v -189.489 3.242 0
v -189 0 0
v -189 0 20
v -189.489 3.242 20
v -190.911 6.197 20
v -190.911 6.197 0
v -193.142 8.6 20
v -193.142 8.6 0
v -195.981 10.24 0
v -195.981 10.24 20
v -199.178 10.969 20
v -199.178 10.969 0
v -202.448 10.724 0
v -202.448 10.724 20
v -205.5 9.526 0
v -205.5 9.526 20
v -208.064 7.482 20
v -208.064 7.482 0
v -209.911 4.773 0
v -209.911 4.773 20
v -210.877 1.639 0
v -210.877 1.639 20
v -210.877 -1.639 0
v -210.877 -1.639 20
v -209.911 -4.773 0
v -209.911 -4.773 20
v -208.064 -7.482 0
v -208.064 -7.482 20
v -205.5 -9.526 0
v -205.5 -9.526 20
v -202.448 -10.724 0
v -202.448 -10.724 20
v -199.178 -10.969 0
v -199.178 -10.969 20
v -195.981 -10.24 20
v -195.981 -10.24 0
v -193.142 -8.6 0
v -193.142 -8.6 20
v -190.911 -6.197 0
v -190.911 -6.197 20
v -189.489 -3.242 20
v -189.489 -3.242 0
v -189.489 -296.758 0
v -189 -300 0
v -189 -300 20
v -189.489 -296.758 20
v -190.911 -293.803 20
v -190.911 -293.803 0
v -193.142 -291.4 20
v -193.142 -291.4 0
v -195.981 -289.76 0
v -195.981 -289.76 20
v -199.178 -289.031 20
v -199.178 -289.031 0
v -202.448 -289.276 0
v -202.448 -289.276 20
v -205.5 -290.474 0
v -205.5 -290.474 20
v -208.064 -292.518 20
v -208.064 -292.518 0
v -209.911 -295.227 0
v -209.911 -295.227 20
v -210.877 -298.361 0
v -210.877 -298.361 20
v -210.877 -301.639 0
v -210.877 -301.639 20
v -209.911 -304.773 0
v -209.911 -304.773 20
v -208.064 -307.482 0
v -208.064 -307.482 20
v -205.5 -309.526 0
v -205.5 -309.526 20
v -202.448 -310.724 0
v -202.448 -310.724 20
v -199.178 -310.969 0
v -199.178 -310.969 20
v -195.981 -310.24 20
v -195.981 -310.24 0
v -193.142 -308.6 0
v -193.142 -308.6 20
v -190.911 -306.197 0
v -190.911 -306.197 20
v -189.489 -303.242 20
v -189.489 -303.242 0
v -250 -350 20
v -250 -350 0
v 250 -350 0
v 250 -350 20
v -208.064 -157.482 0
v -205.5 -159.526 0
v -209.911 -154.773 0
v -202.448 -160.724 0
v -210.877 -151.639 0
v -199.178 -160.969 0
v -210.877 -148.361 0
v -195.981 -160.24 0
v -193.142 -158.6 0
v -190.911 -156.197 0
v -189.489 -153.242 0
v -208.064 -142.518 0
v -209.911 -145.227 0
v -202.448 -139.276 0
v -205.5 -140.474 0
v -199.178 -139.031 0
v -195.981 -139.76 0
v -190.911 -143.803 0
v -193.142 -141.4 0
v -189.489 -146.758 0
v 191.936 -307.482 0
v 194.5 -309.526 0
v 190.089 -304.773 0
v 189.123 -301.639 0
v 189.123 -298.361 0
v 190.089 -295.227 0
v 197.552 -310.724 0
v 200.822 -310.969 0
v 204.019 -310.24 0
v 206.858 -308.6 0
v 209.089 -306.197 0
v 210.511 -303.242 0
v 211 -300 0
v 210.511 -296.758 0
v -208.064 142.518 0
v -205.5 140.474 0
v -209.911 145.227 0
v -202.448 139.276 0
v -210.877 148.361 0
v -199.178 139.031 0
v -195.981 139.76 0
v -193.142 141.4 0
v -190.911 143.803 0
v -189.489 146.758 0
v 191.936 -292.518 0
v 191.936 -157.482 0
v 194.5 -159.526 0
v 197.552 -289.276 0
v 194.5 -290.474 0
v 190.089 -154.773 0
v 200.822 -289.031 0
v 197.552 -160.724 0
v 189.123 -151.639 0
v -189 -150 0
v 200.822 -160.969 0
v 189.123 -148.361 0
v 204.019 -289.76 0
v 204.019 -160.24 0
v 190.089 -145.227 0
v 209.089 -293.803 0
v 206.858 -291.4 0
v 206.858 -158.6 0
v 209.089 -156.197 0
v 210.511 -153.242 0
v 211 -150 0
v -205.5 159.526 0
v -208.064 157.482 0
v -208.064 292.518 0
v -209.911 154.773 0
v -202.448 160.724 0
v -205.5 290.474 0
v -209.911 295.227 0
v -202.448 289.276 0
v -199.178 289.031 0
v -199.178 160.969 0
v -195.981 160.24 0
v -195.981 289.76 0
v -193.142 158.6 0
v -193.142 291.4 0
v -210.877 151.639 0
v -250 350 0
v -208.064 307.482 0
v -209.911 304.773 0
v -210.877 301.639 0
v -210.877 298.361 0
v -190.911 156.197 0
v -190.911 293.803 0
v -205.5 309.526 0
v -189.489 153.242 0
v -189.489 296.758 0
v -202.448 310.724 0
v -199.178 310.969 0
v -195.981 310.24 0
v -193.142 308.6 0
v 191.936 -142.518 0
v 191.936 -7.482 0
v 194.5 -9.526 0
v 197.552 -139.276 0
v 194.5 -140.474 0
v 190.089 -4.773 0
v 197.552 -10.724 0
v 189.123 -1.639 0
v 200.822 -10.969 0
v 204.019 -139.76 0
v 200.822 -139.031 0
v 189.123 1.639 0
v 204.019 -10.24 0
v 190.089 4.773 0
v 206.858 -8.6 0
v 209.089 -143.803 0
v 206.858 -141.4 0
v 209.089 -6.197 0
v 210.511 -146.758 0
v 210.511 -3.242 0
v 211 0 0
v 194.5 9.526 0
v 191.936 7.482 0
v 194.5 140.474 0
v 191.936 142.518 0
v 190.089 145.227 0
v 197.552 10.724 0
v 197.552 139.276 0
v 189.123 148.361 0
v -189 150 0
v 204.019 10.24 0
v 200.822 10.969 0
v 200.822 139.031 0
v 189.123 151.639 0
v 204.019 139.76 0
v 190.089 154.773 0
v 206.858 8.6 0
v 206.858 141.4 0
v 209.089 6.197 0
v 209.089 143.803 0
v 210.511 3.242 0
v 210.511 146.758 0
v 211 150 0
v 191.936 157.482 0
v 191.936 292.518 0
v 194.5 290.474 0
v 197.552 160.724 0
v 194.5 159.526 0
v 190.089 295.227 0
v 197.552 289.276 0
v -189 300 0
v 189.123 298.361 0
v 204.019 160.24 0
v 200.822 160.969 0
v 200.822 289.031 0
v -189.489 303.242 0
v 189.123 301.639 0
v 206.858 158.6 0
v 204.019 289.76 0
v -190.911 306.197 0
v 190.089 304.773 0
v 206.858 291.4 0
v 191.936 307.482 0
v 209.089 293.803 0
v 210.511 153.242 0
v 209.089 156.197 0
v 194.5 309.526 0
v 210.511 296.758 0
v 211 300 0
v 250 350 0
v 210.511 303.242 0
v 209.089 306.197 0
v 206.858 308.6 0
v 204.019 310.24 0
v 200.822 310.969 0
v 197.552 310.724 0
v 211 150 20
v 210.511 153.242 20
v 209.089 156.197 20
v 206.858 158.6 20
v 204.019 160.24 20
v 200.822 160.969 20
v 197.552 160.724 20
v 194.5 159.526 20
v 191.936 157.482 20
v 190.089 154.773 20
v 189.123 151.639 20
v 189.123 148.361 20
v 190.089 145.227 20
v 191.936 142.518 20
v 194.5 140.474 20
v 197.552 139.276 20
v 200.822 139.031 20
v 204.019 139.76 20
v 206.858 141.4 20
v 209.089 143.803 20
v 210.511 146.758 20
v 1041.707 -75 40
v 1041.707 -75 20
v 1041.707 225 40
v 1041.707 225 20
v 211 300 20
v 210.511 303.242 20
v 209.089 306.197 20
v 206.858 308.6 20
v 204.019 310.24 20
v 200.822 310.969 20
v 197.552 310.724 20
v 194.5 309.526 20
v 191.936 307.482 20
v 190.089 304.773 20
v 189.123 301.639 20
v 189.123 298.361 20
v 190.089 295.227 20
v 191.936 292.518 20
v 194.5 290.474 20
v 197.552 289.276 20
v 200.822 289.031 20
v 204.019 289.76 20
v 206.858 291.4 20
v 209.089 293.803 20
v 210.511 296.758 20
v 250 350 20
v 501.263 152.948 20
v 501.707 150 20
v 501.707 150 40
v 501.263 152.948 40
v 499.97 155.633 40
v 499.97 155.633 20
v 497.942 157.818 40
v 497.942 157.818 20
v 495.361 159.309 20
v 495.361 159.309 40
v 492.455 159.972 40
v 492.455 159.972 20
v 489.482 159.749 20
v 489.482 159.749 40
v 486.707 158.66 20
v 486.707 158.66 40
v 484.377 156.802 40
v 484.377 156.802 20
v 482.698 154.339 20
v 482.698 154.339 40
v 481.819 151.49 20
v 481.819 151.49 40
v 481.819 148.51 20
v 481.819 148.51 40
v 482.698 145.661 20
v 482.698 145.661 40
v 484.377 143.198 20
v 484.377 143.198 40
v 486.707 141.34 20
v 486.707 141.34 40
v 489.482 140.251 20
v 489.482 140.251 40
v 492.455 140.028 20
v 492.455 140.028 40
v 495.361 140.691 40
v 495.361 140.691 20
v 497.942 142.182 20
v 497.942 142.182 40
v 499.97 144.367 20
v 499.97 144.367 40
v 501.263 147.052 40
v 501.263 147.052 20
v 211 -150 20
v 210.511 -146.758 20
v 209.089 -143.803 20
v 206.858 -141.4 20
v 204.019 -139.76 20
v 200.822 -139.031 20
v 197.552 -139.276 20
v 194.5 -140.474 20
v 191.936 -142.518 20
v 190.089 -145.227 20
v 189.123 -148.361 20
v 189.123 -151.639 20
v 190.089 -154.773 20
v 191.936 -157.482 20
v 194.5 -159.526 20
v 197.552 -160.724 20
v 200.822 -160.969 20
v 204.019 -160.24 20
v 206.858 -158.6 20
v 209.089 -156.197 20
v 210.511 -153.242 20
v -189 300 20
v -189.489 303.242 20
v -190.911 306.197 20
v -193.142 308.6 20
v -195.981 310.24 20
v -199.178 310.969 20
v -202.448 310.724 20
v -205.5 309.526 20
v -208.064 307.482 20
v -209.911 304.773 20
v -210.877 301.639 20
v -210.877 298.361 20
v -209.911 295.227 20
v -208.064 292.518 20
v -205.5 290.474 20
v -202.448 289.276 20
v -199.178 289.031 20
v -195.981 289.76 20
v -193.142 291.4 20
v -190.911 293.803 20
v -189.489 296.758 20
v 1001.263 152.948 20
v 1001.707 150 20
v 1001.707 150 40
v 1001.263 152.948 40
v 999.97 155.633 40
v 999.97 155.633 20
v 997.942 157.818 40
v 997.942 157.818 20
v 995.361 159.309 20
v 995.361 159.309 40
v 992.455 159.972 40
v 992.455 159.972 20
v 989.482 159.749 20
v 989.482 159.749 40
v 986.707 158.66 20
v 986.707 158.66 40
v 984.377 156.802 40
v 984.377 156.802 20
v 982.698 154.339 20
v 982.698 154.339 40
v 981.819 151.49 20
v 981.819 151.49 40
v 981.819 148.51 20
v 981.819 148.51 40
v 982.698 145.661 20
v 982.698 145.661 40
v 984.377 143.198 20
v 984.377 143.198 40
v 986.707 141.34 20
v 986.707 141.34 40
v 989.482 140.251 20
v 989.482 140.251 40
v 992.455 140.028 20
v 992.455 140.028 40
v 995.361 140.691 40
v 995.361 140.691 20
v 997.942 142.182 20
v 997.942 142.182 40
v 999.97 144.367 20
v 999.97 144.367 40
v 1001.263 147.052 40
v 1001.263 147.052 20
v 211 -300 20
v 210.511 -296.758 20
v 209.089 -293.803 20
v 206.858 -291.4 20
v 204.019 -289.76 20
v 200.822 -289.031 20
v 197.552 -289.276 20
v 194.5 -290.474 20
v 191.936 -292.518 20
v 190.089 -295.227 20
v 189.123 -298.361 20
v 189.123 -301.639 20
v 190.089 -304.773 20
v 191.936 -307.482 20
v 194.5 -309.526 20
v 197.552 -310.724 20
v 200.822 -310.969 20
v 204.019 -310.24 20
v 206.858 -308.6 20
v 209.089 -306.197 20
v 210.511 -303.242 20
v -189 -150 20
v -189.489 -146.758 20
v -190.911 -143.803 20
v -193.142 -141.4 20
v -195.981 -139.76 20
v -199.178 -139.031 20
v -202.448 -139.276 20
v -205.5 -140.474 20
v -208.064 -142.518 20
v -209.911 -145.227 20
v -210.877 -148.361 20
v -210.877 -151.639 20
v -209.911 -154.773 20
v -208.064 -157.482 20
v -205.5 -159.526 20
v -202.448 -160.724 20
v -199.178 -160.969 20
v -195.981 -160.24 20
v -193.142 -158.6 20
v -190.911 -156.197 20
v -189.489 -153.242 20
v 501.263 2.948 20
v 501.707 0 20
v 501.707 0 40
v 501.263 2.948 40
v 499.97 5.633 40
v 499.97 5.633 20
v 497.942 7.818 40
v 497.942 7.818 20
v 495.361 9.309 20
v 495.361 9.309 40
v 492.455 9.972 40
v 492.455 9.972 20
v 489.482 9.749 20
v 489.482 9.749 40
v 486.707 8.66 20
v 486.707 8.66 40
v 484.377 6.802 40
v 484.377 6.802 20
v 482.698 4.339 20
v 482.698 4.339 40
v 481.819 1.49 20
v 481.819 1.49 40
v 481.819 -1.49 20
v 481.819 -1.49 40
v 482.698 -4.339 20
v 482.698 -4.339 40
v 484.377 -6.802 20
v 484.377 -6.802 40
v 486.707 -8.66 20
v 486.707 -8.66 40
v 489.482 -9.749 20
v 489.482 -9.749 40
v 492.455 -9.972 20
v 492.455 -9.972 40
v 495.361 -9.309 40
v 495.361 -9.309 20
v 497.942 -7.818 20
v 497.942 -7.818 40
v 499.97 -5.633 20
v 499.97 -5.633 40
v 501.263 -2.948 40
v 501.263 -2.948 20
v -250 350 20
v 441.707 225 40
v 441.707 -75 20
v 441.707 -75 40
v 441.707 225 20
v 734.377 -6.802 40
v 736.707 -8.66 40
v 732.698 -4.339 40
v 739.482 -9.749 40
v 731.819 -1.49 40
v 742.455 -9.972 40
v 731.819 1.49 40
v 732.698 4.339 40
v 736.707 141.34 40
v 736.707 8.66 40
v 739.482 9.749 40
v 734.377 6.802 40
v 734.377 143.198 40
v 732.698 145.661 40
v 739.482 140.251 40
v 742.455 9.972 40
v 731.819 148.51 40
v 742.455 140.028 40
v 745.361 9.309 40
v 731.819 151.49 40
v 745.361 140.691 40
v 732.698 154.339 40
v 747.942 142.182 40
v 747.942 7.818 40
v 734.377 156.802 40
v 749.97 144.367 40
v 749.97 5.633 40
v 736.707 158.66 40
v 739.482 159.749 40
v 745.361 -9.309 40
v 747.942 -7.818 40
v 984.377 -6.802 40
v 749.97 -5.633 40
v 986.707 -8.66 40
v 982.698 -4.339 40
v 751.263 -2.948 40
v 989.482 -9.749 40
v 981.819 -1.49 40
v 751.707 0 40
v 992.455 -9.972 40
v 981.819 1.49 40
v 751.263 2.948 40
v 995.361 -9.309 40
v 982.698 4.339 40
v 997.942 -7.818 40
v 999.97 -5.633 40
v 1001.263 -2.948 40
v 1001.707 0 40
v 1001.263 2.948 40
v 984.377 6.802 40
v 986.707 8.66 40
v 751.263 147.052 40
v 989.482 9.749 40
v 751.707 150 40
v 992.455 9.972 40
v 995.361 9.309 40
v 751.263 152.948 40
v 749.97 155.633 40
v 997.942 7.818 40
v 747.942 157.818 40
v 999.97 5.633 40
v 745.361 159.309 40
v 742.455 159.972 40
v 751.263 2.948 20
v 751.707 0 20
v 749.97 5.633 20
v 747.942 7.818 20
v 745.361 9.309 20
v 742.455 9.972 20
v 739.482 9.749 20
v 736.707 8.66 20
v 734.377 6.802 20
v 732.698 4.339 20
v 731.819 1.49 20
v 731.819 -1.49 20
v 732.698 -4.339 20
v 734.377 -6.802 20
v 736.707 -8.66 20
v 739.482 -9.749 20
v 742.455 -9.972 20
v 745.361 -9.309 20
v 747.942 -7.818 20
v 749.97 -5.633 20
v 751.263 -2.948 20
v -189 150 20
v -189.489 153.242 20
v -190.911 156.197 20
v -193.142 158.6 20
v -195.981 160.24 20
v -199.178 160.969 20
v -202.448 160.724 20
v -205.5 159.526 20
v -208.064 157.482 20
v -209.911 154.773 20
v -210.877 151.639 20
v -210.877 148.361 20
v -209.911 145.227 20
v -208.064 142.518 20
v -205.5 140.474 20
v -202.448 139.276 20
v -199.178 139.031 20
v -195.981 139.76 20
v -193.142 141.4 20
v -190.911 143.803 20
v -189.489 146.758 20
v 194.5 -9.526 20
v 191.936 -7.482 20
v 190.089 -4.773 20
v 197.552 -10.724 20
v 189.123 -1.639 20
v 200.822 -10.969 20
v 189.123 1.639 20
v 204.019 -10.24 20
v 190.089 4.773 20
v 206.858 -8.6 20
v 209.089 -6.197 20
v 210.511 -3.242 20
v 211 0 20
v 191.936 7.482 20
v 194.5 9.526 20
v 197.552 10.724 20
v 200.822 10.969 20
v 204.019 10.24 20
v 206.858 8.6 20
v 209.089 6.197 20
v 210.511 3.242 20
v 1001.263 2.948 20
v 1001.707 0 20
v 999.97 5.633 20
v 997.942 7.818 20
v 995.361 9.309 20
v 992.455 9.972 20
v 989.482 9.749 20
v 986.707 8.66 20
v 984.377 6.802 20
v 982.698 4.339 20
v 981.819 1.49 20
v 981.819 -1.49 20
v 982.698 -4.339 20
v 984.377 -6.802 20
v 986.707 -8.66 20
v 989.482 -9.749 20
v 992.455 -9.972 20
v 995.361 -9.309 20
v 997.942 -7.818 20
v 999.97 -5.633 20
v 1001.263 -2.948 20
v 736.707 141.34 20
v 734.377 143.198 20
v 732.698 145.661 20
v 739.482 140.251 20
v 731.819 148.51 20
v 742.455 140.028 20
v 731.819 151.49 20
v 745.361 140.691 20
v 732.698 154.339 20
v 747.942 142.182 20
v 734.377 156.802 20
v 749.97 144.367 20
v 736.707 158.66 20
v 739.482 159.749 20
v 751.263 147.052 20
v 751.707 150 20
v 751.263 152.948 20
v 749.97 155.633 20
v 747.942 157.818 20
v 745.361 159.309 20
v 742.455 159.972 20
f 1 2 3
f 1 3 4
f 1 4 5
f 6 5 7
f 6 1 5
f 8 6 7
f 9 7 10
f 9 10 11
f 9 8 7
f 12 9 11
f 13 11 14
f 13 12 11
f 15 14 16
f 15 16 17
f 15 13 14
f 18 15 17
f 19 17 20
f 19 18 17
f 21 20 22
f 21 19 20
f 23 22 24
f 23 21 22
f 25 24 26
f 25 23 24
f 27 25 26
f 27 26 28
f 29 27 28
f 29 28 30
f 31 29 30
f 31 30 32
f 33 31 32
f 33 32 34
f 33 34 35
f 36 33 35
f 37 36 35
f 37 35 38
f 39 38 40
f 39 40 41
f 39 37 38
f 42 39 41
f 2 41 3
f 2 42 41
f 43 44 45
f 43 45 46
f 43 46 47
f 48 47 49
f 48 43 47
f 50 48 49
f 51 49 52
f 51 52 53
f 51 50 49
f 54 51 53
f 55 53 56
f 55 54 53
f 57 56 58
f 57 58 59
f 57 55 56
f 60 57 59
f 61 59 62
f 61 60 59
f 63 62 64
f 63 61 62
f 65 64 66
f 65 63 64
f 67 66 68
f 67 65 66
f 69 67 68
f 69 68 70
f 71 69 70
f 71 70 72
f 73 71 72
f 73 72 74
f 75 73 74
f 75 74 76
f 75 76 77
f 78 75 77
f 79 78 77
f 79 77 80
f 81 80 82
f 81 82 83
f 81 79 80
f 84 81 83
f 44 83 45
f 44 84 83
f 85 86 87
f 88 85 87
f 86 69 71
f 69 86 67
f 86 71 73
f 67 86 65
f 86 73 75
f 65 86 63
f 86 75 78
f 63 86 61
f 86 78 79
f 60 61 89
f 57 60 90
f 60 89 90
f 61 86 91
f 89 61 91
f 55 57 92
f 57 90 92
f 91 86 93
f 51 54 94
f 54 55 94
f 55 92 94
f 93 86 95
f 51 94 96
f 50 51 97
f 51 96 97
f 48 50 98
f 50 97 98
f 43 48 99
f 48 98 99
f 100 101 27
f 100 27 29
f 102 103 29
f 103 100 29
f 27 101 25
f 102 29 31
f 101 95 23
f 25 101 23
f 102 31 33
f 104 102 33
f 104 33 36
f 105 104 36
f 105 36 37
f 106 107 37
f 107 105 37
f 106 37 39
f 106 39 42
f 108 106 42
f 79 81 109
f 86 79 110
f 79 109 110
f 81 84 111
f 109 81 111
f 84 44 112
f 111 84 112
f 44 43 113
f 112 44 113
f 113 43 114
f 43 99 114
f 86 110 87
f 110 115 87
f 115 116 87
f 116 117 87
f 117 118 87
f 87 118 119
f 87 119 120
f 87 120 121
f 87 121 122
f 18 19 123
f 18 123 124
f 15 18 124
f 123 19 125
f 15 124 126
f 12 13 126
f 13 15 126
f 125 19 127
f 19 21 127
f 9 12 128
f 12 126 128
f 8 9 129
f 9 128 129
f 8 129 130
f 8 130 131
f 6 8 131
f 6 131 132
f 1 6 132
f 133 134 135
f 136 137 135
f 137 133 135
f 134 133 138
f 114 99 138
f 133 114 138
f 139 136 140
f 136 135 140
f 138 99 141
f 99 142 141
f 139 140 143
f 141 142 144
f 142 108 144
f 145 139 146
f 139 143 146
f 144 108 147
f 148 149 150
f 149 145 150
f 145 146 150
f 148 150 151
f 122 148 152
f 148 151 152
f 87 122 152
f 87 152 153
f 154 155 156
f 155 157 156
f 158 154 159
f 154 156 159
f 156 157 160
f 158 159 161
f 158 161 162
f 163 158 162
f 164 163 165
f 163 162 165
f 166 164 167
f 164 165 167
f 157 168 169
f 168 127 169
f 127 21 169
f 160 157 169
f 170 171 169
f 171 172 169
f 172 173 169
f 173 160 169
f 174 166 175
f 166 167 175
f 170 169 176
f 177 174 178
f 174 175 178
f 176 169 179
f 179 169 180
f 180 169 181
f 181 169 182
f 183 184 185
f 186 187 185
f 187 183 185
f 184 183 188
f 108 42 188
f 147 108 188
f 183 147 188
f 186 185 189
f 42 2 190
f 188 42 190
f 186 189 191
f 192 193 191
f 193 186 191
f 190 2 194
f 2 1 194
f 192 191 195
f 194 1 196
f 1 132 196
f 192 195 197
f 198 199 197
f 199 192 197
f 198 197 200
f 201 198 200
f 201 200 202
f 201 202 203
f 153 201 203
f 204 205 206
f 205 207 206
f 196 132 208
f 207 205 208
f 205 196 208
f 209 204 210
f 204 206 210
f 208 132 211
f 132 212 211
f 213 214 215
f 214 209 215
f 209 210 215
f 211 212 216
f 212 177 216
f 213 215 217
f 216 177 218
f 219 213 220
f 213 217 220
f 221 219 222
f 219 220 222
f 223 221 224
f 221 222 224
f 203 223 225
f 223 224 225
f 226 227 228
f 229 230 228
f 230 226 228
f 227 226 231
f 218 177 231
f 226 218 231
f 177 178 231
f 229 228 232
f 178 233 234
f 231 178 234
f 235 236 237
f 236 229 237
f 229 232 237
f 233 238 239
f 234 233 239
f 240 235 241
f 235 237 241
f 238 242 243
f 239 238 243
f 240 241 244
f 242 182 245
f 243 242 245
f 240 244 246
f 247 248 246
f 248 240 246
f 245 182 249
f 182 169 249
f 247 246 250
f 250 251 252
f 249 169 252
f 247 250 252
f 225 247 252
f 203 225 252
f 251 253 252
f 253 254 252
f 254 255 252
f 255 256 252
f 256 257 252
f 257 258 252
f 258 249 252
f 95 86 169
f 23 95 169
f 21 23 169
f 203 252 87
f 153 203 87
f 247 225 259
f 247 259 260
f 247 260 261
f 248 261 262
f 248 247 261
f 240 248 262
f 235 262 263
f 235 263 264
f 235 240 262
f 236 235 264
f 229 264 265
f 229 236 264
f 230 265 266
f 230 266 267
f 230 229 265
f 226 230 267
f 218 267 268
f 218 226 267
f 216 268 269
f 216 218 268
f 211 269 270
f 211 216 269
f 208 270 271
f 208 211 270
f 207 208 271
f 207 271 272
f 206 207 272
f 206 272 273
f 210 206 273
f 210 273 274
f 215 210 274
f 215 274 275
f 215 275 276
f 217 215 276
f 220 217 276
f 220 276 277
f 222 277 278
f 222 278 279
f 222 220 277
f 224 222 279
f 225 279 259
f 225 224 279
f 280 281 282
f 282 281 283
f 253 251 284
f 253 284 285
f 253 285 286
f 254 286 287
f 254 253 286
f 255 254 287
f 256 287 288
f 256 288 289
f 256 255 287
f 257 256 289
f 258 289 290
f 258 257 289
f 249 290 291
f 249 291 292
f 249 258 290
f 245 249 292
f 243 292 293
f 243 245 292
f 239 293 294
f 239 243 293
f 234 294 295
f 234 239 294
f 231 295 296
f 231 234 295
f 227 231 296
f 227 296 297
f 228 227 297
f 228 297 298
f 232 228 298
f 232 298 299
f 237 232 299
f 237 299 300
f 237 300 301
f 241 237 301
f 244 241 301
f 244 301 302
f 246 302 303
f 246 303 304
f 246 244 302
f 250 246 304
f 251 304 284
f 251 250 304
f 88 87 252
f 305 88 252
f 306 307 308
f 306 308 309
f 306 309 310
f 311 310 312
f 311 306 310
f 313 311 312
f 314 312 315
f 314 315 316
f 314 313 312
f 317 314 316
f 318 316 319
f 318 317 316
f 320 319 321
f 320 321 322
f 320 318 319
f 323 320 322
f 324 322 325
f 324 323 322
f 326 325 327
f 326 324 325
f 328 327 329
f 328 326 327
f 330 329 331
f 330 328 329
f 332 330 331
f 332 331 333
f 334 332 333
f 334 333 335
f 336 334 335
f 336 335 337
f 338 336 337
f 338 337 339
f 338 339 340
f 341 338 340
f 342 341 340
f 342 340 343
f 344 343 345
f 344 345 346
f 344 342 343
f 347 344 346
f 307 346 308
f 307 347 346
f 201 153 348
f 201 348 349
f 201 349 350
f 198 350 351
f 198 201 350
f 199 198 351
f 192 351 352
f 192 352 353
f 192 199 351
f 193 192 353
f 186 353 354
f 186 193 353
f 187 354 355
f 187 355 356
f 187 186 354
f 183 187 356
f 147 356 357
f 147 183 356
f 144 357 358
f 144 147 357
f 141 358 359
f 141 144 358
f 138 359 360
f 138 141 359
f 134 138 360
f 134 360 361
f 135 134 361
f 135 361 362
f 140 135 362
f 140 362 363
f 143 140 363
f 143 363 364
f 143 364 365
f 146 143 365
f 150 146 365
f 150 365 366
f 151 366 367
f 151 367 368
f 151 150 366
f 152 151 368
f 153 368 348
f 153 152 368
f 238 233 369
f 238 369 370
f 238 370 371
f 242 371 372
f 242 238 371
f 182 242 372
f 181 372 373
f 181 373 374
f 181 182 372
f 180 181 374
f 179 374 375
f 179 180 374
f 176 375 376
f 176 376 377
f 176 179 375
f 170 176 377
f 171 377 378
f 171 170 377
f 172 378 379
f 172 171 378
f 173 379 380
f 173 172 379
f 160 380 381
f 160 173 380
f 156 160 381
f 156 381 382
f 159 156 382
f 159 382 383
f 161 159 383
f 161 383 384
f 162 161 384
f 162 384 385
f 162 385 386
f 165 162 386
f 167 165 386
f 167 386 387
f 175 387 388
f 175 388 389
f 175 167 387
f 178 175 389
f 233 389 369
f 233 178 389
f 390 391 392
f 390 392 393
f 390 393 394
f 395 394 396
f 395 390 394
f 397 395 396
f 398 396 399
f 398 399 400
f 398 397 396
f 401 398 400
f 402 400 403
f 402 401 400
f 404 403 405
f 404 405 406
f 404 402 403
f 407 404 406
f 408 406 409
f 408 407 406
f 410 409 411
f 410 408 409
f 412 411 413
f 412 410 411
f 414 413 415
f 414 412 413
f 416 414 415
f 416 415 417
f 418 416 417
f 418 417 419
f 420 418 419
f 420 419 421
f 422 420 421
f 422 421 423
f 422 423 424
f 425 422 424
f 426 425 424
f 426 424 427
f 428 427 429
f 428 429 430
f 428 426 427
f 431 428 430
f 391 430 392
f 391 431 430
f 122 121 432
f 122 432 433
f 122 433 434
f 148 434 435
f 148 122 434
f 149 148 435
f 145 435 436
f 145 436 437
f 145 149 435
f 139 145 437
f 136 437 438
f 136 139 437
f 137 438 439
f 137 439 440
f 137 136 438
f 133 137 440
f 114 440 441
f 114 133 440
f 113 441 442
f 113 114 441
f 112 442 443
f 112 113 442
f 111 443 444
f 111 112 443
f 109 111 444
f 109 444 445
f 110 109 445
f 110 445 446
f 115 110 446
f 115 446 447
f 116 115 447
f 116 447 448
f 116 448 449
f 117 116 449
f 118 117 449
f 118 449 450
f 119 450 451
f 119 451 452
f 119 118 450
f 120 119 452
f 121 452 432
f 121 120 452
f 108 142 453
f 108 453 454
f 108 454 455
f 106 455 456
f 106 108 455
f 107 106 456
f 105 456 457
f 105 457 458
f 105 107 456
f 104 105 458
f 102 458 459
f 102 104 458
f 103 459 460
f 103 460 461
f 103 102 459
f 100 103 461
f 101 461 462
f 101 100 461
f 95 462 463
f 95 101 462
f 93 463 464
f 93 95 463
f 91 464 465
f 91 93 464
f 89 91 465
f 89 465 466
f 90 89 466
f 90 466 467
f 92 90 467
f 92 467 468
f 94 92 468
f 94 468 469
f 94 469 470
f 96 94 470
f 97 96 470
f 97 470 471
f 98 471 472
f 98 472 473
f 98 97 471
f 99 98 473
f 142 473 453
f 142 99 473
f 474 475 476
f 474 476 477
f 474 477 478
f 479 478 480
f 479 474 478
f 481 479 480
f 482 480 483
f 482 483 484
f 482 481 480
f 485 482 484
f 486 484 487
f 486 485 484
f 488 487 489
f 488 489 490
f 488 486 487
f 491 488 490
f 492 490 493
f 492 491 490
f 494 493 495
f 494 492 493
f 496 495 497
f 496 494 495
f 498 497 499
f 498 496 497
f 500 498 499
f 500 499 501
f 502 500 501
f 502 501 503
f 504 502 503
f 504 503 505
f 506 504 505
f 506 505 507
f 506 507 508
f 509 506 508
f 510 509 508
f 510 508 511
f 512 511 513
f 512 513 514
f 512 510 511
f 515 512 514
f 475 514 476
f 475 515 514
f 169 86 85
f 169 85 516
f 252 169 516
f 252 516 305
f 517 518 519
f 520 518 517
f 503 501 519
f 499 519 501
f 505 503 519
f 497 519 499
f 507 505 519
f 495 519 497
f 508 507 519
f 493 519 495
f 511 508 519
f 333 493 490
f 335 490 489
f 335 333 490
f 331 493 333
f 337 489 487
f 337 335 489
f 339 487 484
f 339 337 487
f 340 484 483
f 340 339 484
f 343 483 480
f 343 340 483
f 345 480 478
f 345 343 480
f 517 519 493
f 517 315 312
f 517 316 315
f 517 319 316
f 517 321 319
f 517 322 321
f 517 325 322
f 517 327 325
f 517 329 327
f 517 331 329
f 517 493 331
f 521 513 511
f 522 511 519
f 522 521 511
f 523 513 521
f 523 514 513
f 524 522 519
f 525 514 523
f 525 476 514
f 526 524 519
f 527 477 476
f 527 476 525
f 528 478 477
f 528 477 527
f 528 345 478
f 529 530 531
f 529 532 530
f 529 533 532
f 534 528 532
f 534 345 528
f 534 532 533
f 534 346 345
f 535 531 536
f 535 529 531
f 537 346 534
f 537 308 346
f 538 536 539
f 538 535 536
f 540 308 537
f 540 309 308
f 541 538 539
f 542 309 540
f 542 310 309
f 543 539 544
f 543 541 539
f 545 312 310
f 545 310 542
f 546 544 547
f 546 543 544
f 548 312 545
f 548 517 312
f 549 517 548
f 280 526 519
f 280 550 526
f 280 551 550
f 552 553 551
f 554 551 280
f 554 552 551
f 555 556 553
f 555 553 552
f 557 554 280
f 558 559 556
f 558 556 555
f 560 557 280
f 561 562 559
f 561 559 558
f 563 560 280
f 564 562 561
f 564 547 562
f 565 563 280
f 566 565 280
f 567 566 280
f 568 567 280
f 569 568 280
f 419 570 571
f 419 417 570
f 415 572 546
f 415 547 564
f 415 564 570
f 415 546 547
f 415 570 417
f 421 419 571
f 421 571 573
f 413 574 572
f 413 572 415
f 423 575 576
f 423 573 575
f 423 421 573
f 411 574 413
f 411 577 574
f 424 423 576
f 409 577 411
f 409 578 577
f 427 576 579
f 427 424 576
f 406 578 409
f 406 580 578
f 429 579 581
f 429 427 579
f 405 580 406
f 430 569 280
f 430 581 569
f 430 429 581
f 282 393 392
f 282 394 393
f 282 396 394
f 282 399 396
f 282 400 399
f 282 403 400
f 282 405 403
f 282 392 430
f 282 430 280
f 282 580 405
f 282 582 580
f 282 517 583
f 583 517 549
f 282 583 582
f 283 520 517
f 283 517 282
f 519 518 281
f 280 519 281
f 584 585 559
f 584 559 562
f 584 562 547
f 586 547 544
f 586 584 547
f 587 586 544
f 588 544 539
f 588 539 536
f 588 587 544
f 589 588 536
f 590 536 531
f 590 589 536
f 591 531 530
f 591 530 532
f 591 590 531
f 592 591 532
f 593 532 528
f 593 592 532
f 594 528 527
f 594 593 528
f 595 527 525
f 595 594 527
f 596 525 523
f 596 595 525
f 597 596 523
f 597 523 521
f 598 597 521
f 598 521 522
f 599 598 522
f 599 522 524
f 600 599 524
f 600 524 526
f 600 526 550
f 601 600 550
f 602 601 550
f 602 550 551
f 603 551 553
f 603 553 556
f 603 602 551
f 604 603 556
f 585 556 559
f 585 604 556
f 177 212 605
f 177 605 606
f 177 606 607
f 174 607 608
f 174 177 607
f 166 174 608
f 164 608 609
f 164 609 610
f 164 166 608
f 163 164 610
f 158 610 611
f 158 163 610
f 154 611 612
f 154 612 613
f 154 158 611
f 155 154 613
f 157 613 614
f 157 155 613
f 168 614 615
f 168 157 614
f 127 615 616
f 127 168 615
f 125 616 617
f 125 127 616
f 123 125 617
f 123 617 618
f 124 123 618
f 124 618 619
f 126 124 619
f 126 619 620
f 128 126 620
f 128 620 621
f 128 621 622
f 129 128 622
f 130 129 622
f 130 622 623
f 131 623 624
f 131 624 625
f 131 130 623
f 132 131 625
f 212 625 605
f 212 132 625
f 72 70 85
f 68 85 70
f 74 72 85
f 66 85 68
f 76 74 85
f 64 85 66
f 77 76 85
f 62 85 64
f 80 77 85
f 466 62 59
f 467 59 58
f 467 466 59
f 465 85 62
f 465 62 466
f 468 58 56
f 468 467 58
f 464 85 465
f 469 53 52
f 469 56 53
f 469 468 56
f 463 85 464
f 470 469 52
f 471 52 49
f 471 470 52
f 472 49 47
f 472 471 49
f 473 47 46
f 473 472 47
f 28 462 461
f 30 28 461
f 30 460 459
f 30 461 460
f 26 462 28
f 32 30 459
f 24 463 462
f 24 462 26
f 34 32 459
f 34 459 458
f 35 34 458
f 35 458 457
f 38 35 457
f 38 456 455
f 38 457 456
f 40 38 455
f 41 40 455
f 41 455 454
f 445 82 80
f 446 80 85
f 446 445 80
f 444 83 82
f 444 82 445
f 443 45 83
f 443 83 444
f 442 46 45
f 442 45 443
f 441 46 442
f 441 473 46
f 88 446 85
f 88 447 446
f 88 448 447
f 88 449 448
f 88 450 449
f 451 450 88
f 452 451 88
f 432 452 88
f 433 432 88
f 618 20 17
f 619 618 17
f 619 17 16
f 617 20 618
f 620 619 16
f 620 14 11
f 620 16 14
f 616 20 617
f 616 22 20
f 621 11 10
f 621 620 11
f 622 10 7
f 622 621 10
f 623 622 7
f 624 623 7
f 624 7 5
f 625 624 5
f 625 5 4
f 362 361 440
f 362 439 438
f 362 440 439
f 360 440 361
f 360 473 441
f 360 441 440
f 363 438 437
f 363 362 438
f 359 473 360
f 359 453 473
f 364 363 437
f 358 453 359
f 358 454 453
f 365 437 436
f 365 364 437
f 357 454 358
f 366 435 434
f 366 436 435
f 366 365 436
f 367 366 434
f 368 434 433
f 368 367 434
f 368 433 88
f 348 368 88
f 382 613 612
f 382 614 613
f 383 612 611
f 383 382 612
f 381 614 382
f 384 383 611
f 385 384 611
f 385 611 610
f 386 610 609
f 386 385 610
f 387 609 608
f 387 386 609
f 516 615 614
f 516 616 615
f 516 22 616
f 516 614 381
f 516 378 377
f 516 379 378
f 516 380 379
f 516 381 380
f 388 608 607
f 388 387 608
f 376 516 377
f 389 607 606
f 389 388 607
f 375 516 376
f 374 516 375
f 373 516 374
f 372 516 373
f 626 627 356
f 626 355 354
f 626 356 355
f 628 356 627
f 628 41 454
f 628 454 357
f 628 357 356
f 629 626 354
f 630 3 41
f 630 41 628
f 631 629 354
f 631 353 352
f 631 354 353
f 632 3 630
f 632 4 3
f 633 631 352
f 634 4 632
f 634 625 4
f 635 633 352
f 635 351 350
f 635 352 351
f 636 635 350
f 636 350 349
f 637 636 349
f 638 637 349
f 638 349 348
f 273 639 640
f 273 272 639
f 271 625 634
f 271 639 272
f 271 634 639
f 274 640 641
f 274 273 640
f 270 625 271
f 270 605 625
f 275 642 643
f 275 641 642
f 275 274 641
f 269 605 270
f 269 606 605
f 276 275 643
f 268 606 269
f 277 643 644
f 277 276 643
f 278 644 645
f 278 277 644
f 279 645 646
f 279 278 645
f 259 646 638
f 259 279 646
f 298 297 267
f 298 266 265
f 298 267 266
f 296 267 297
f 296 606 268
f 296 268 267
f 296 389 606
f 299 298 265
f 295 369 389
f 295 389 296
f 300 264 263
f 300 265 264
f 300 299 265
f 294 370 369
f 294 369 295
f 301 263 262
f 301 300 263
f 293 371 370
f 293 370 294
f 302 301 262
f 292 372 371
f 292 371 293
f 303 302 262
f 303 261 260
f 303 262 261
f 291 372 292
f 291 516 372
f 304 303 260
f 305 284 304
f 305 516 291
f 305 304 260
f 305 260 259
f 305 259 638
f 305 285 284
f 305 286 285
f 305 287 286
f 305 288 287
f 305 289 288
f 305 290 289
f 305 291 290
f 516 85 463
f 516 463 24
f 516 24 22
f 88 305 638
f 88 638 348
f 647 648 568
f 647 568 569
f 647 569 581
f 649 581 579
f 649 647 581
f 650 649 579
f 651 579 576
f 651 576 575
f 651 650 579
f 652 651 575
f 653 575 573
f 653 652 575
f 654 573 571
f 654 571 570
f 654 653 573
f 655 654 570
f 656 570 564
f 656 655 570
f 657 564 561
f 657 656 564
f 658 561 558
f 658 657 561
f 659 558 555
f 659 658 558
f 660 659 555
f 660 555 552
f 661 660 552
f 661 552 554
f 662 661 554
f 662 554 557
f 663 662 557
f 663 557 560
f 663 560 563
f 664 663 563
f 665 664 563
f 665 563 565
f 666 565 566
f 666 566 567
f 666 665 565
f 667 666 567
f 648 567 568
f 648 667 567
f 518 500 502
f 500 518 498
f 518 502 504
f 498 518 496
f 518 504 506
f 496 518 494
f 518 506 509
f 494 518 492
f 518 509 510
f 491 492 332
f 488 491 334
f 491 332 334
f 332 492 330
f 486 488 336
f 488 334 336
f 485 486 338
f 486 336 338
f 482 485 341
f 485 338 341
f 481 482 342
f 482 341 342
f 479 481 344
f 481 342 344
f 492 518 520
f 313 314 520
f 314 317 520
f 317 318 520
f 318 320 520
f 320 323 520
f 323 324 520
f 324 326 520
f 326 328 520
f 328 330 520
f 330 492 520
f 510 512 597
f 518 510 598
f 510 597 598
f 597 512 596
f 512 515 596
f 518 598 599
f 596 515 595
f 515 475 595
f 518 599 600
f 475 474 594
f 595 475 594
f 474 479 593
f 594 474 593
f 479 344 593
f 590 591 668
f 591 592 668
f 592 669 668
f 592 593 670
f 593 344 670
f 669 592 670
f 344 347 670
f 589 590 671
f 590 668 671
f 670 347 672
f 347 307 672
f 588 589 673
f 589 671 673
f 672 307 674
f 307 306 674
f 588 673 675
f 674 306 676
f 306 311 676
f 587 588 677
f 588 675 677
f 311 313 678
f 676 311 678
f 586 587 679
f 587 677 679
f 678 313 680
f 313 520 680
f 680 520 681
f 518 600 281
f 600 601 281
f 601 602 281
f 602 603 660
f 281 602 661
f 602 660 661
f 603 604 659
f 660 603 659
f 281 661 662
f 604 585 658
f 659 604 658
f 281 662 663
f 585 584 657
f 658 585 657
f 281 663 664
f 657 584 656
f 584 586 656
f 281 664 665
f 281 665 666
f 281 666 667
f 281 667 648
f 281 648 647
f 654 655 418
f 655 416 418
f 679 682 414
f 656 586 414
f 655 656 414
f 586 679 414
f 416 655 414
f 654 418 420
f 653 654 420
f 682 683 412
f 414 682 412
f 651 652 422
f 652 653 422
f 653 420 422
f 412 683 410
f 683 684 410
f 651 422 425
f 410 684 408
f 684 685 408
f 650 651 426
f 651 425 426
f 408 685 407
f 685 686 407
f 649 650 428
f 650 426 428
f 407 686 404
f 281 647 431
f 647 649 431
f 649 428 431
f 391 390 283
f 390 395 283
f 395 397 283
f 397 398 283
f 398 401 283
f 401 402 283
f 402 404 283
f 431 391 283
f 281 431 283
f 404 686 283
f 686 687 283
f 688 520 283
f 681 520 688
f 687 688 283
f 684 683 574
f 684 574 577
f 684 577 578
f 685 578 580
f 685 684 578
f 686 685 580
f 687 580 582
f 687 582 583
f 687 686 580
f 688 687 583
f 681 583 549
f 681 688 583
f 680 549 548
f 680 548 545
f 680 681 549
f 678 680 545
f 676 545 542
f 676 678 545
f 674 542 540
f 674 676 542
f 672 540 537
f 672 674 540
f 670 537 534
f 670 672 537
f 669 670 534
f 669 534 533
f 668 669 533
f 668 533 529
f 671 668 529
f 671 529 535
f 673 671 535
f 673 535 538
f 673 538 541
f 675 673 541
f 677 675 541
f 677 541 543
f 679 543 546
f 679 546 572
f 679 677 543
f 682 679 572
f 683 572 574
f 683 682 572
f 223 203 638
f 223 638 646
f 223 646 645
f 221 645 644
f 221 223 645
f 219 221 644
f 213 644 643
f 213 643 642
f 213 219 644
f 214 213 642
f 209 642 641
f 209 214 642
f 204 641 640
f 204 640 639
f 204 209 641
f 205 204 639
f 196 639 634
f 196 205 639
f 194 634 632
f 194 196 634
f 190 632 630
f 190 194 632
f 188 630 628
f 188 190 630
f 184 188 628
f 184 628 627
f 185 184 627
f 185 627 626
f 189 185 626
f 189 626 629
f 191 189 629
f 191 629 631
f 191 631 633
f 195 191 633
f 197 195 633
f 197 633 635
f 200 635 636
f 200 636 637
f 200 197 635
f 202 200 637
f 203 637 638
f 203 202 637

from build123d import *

# Parameters (mm, degrees)
F1_W     = 500
F1_H     = 700
F1_R     = 11
F2_DEPTH = 20
F3_W     = 600
F3_H     = 300
F3_R     = 10
F4_DEPTH = 20


with BuildPart() as f2:
    # F1 (on face) → F2 (new body)
    with BuildSketch(Plane.XY):
        Rectangle(F1_W, F1_H)
        with Locations((-200, -300)):
            Circle(F1_R, mode=Mode.SUBTRACT)
        with Locations((-200, -150)):
            Circle(F1_R, mode=Mode.SUBTRACT)
        with Locations((200, -300)):
            Circle(F1_R, mode=Mode.SUBTRACT)
        with Locations((200, -150)):
            Circle(F1_R, mode=Mode.SUBTRACT)
        with Locations((-200, 0)):
            Circle(F1_R, mode=Mode.SUBTRACT)
        with Locations((-200, 150)):
            Circle(F1_R, mode=Mode.SUBTRACT)
        with Locations((-200, 300)):
            Circle(F1_R, mode=Mode.SUBTRACT)
        with Locations((200, 0)):
            Circle(F1_R, mode=Mode.SUBTRACT)
        with Locations((200, 150)):
            Circle(F1_R, mode=Mode.SUBTRACT)
        with Locations((200, 300)):
            Circle(F1_R, mode=Mode.SUBTRACT)
    extrude(amount=F2_DEPTH)


with BuildPart() as f4:
    # F3 (on face) → F4 (new body)
    with BuildSketch(Plane.XY.offset(20)):
        with Locations((741.707468, 75)):
            Rectangle(F3_W, F3_H)
        with Locations((491.707468, 0)):
            Circle(F3_R, mode=Mode.SUBTRACT)
        with Locations((491.707468, 150)):
            Circle(F3_R, mode=Mode.SUBTRACT)
        with Locations((741.707468, 0)):
            Circle(F3_R, mode=Mode.SUBTRACT)
        with Locations((991.707468, 0)):
            Circle(F3_R, mode=Mode.SUBTRACT)
        with Locations((741.707468, 150)):
            Circle(F3_R, mode=Mode.SUBTRACT)
        with Locations((991.707468, 150)):
            Circle(F3_R, mode=Mode.SUBTRACT)
    extrude(amount=F4_DEPTH)


solid = Compound([f2.part, f4.part])
